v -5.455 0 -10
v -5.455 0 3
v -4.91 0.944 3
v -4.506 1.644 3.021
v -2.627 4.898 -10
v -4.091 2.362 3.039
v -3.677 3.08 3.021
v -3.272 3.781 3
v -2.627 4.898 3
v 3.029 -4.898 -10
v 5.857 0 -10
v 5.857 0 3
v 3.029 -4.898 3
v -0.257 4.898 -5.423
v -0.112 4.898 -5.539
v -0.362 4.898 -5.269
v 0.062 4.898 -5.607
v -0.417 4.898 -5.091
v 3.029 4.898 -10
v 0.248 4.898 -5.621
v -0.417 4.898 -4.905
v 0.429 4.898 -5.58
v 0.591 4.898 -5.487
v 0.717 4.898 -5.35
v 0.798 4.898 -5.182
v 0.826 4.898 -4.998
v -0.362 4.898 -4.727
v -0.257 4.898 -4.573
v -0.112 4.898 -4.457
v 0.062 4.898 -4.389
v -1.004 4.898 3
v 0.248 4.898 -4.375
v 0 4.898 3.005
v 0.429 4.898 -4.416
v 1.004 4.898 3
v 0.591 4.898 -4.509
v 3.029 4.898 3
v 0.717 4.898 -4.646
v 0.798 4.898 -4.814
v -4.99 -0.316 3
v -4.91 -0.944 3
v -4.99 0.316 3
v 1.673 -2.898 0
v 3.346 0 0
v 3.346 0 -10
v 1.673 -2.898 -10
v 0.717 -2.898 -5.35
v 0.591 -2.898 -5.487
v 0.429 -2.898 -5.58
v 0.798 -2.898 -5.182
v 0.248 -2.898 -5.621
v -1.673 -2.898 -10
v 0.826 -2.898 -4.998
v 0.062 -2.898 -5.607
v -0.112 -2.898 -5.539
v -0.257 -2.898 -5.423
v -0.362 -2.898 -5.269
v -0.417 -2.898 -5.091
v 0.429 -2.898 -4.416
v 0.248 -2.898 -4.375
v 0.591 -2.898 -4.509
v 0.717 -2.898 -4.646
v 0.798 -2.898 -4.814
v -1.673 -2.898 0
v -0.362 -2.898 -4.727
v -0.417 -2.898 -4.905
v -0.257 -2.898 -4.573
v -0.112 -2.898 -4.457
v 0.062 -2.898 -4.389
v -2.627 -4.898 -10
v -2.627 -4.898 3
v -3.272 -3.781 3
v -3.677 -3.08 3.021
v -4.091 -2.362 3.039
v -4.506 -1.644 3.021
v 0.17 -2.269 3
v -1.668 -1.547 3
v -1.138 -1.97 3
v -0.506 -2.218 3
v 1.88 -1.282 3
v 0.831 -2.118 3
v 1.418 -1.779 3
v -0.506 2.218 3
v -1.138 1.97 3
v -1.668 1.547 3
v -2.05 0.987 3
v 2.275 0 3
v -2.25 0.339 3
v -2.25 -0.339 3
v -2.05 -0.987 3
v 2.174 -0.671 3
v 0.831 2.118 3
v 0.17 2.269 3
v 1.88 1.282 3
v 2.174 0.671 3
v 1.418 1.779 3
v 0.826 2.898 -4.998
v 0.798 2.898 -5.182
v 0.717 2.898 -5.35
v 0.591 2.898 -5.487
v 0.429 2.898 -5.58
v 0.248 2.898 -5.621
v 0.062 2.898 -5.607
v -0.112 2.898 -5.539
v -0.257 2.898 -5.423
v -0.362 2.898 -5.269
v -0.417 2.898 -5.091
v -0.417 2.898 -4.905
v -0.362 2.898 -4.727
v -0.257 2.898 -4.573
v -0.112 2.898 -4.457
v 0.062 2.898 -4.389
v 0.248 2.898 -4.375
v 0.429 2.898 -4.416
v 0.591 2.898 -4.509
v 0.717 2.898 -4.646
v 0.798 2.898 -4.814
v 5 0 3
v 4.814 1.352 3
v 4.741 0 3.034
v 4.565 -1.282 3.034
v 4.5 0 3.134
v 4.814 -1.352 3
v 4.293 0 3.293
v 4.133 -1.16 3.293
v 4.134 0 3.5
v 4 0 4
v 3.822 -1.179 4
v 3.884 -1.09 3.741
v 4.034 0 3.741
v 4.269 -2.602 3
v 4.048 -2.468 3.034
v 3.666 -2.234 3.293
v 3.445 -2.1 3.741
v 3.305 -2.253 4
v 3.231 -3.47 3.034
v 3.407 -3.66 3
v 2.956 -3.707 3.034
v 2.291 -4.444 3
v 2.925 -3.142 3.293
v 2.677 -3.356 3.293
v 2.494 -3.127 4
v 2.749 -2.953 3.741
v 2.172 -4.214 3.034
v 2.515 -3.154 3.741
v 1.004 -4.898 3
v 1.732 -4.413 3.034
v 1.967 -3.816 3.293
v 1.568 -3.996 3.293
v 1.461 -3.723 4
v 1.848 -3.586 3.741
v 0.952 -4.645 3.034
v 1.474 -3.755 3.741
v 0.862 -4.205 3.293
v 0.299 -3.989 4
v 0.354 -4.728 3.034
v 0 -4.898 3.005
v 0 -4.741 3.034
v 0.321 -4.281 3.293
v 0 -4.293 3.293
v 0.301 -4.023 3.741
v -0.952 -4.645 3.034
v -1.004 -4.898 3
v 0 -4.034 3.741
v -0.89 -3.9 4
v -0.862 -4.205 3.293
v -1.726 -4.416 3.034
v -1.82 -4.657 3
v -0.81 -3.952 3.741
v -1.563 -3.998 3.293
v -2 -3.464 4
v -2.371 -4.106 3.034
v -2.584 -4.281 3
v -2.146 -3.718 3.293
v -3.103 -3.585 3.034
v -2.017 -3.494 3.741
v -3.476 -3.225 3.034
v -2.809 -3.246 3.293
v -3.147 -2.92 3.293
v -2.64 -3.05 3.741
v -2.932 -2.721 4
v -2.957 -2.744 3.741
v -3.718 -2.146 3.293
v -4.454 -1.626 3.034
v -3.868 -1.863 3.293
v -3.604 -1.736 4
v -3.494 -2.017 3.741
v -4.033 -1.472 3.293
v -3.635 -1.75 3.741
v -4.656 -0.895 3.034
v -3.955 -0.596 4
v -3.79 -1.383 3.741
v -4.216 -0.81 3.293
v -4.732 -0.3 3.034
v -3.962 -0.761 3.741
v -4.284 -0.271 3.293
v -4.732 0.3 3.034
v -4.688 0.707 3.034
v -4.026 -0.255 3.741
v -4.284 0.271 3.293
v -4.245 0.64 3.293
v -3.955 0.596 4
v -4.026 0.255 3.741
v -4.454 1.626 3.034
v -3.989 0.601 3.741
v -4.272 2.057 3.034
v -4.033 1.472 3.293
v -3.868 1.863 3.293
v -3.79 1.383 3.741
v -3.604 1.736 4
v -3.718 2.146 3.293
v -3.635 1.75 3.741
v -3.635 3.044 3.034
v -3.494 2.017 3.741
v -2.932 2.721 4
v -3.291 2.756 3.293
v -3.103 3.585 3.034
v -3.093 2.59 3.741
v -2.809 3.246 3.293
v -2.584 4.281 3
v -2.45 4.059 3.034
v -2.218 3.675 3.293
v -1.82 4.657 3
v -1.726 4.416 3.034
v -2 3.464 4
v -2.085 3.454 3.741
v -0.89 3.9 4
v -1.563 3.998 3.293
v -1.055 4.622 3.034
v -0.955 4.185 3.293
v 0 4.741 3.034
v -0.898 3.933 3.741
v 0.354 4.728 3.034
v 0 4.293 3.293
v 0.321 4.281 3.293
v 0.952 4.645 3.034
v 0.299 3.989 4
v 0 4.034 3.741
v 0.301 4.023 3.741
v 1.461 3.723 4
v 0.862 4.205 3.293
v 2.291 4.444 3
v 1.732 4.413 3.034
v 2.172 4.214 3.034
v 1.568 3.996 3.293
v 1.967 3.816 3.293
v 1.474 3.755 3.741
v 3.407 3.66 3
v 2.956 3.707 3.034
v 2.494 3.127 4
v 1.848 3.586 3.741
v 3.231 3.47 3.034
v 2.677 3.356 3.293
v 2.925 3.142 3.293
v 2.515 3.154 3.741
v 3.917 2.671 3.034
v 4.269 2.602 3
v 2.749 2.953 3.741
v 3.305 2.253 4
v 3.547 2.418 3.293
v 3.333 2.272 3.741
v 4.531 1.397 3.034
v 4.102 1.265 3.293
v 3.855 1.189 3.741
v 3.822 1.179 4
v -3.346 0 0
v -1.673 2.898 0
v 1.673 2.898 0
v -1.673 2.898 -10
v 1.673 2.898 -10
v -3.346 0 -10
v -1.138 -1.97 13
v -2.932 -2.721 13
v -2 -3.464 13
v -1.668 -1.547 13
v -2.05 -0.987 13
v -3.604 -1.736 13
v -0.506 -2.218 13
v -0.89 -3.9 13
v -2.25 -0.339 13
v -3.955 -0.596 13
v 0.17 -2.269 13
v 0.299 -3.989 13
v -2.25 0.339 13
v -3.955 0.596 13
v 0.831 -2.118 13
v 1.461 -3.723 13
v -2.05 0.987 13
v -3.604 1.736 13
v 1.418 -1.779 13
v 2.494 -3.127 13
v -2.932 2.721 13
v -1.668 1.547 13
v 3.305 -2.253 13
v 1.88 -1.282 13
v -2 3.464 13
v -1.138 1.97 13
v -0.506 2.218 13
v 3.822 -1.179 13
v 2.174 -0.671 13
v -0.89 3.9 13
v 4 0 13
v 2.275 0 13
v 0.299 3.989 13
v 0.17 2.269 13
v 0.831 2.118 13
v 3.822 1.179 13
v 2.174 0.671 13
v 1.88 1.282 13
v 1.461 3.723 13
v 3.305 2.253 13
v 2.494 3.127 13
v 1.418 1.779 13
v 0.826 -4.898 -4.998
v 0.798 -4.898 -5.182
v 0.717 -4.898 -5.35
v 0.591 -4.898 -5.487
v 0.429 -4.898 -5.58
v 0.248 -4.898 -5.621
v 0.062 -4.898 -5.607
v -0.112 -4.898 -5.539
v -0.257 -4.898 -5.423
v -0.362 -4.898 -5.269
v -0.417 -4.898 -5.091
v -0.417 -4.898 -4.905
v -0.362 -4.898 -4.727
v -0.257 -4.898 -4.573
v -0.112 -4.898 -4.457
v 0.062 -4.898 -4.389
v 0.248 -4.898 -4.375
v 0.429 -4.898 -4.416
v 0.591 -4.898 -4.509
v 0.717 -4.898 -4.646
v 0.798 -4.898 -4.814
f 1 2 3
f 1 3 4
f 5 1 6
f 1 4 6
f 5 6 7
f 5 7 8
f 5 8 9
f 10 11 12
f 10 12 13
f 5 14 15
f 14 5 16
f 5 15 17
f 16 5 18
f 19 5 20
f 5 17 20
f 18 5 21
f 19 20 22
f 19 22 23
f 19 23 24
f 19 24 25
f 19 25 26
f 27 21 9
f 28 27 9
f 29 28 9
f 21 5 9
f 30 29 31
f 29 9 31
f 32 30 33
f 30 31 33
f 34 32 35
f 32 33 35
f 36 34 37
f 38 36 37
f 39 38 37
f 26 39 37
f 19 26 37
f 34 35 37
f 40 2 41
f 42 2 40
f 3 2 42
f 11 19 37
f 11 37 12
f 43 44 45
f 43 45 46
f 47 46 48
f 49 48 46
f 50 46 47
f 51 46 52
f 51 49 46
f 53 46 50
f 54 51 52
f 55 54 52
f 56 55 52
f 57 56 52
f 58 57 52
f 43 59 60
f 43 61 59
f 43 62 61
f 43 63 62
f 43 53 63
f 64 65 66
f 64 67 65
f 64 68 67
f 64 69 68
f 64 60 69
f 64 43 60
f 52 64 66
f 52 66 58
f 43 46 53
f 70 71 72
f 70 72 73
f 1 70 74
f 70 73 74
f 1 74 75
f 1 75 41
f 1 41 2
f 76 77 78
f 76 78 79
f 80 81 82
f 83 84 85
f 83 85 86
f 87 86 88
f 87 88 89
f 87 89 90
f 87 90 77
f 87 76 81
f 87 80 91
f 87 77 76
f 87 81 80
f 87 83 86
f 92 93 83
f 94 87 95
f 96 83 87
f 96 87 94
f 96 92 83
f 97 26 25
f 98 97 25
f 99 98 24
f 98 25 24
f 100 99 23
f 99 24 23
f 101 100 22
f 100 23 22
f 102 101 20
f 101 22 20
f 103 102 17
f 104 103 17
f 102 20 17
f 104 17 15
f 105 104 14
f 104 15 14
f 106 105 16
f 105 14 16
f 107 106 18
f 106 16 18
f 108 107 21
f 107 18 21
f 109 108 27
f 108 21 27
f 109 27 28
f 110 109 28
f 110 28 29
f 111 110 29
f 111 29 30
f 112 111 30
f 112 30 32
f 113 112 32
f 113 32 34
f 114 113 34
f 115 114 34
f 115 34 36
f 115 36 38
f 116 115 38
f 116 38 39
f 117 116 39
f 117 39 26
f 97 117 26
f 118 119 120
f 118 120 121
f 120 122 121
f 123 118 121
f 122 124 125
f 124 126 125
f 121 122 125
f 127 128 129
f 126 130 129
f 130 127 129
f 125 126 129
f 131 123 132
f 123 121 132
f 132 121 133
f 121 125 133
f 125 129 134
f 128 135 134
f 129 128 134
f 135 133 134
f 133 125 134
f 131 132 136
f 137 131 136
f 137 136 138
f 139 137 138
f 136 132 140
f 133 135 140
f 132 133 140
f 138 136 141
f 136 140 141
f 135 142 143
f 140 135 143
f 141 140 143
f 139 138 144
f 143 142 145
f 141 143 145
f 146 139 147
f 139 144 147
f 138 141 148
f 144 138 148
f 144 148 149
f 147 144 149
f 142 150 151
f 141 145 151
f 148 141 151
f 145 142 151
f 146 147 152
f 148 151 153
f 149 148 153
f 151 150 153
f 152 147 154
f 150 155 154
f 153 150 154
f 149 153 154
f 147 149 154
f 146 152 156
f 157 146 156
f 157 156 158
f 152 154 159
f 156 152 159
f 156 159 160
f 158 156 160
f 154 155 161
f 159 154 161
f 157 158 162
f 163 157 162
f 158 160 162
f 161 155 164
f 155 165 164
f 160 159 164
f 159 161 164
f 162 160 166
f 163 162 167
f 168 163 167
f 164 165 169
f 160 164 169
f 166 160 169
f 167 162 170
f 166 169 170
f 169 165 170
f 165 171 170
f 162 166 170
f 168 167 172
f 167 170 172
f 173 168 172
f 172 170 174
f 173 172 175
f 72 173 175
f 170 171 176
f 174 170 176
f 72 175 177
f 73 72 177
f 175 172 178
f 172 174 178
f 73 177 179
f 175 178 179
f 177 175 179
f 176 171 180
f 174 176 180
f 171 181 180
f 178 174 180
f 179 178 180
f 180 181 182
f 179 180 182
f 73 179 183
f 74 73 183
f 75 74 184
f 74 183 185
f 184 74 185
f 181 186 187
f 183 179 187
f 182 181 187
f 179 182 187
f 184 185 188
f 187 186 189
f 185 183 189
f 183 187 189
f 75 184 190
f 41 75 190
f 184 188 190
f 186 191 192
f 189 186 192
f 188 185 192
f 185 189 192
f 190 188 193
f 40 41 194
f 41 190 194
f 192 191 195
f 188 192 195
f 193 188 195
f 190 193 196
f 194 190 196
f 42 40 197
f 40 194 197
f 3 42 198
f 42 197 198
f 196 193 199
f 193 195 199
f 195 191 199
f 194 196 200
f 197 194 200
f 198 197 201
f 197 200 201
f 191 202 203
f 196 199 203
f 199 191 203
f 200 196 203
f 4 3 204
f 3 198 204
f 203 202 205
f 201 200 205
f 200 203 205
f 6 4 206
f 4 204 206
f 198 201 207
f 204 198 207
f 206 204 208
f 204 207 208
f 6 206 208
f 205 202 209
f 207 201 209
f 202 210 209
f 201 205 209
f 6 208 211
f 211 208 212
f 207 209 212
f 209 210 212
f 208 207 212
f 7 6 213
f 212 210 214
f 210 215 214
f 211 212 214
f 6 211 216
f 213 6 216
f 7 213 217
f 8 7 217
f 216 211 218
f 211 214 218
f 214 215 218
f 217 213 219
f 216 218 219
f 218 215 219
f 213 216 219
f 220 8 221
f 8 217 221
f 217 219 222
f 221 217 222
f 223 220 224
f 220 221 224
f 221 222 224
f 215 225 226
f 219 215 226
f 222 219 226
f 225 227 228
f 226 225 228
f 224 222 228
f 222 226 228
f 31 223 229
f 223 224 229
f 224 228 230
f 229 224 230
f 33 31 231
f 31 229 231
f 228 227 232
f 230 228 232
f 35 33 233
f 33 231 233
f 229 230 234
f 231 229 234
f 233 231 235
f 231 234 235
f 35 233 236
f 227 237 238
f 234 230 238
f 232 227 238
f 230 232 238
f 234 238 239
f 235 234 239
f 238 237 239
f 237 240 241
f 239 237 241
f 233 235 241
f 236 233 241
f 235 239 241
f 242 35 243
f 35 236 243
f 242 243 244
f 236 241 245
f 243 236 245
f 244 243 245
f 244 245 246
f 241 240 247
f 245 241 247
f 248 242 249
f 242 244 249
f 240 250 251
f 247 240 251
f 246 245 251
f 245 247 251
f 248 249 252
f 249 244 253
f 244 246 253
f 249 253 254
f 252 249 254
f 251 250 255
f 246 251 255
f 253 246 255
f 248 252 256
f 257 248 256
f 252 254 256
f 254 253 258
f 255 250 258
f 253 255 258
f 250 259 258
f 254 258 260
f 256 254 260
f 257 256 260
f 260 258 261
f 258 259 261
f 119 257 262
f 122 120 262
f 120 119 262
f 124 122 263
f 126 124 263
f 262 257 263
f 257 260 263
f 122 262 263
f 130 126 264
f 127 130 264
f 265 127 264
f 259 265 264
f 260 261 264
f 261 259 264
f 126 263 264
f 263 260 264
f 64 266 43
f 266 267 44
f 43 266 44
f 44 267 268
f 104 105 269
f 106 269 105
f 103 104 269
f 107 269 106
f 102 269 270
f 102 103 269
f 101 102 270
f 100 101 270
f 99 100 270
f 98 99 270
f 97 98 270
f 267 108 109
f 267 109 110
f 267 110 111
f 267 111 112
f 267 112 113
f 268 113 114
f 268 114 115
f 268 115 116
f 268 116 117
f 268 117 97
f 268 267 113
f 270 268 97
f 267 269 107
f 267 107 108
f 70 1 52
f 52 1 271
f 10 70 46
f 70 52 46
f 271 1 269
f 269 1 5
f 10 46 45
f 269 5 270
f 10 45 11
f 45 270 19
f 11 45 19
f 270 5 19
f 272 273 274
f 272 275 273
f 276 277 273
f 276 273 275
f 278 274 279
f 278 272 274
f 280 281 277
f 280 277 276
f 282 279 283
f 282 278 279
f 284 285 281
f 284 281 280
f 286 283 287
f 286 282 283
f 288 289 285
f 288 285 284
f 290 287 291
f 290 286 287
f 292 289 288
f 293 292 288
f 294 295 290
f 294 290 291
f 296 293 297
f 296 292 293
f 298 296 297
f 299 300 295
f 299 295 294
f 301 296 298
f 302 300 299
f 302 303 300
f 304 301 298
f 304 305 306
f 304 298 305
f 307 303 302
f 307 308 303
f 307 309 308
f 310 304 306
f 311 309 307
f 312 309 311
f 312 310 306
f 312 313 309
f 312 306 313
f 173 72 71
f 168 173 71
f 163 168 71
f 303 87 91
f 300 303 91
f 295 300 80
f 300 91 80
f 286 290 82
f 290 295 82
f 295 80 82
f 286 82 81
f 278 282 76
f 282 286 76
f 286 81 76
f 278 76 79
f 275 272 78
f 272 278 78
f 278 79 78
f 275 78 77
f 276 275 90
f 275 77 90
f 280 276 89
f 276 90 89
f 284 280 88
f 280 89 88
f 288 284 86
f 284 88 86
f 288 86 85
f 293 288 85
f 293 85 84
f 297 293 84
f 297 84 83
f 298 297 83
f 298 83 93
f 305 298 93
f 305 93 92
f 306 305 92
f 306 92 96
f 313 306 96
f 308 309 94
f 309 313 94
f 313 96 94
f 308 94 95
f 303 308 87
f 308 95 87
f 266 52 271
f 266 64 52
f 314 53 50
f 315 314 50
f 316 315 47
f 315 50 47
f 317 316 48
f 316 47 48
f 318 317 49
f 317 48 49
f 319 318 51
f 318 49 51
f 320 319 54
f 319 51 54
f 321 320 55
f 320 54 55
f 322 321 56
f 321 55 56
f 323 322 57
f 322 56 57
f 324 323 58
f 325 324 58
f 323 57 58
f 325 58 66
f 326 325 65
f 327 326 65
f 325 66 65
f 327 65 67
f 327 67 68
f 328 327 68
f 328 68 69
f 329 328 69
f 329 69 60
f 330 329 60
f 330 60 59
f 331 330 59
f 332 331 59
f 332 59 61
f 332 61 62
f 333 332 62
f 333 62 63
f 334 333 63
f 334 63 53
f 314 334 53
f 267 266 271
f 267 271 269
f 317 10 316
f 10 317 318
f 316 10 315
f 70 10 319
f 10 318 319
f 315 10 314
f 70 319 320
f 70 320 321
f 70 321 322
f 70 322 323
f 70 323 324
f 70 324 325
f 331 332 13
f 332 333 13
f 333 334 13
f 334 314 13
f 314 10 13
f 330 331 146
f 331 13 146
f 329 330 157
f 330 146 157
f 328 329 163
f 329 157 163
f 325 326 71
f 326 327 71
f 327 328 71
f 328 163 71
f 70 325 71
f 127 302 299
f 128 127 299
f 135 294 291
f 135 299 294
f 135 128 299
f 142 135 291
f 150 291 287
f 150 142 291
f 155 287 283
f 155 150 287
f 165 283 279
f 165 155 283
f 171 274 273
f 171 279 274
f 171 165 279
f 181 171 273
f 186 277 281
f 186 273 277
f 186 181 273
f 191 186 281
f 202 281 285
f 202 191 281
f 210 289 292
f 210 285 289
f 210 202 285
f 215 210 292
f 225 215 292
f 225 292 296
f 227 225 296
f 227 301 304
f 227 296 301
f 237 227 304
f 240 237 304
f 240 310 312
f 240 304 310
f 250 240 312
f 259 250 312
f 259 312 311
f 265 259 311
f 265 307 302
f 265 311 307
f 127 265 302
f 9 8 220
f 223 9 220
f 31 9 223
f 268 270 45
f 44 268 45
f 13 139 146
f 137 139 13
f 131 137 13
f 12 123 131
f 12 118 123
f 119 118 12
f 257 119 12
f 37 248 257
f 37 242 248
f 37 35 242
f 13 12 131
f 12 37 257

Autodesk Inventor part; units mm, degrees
ref_plane "YZ Plane" through (0, 0, 0) normal (1, 0, 0) x (0, 1, 0)
ref_plane "XZ Plane" through (0, 0, 0) normal (0, 1, 0) x (-1, 0, 0)
ref_plane "XY Plane" through (0, 0, 0) normal (0, 0, 1) x (1, 0, 0)
sketch "Sketch1" plane through (0, 0, 0) normal (0, 0, 1) x (1, 0, 0)
  line L0 (-1.6732, 2.8981) -> (1.6732, 2.8981) projected
  line L1 (-3.3464, 0) -> (-1.6732, 2.8981) projected
  line L2 (-1.6732, -2.8981) -> (-3.3464, 0) projected
  line L3 (1.6732, -2.8981) -> (-1.6732, -2.8981) projected
  line L4 (3.3464, 0) -> (1.6732, -2.8981) projected
  line L5 (1.6732, 2.8981) -> (3.3464, 0) projected
  line L6 (3.0288, 4.8981) -> (5.8567, 0) projected
  line L7 (-2.627, 4.8981) -> (3.0288, 4.8981) projected
  line L8 (-5.4549, 0) -> (-2.627, 4.8981) projected
  line L9 (-2.627, -4.8981) -> (-5.4549, 0) projected
  line L10 (3.0288, -4.8981) -> (-2.627, -4.8981) projected
  line L11 (5.8567, 0) -> (3.0288, -4.8981) projected
  point P0 (0, 0)
extrude "Extrusion1" add sketch "Sketch1" against normal blind 10
sketch "Sketch2" plane through (0, 0, 0) normal (0, 0, 1) x (1, 0, 0)
  line L0 (3.0288, 4.8981) -> (-2.627, 4.8981) projected
  line L1 (-2.627, 4.8981) -> (-5.4549, 0) projected
  line L2 (-5.4549, 0) -> (-2.627, -4.8981) projected
  line L3 (-2.627, -4.8981) -> (3.0288, -4.8981) projected
  line L4 (3.0288, -4.8981) -> (5.8567, 0) projected
  line L5 (5.8567, 0) -> (3.0288, 4.8981) projected
  point P0 (0, 0)
extrude "Extrusion2" add sketch "Sketch2" along normal blind 3
sketch "Sketch3" plane through (0, 0, 3) normal (0, 0, 1) x (1, 0, 0)
  circle A0 centre (0, 0) radius 4
  circle A1 centre (0, 0) radius 2.275
  dimension "d4" = 8
  dimension "d5" = 4.55
extrude "Extrusion3" add sketch "Sketch3" along normal blind 10
fillet "Fillet1" radius 1 1 edges at (-4, 0, 3)
sketch "Sketch4" plane through (-2.627, 4.8981, -10) normal (0, 1, 0) x (1, 0, 0)
  line L0 (5.6558, 0) -> (5.6558, -13) projected
  line L1 (0, 0) -> (5.6558, 0) projected
  line L2 (0, -13) -> (0, 0) projected
  line L3 (5.6558, -13) -> (3.6314, -13) projected
  line L4 (0.9538, -10) -> (4.3002, -10) projected
  line L5 (5.6558, 0) -> (0, 0) projected
  line L6 (2.8279, 0) -> (2.8279, -10) construction
  circle A0 centre (2.8279, -5.002) radius 0.625
  line L7 (1.6226, -13) -> (0, -13) projected
  point P0 (2.627, -10)
  point P1 (2.8279, 0)
  dimension "d9" = 1.25
extrude "Extrusion4" cut sketch "Sketch4" against normal blind 10
properties part number "Acople_Motor"
